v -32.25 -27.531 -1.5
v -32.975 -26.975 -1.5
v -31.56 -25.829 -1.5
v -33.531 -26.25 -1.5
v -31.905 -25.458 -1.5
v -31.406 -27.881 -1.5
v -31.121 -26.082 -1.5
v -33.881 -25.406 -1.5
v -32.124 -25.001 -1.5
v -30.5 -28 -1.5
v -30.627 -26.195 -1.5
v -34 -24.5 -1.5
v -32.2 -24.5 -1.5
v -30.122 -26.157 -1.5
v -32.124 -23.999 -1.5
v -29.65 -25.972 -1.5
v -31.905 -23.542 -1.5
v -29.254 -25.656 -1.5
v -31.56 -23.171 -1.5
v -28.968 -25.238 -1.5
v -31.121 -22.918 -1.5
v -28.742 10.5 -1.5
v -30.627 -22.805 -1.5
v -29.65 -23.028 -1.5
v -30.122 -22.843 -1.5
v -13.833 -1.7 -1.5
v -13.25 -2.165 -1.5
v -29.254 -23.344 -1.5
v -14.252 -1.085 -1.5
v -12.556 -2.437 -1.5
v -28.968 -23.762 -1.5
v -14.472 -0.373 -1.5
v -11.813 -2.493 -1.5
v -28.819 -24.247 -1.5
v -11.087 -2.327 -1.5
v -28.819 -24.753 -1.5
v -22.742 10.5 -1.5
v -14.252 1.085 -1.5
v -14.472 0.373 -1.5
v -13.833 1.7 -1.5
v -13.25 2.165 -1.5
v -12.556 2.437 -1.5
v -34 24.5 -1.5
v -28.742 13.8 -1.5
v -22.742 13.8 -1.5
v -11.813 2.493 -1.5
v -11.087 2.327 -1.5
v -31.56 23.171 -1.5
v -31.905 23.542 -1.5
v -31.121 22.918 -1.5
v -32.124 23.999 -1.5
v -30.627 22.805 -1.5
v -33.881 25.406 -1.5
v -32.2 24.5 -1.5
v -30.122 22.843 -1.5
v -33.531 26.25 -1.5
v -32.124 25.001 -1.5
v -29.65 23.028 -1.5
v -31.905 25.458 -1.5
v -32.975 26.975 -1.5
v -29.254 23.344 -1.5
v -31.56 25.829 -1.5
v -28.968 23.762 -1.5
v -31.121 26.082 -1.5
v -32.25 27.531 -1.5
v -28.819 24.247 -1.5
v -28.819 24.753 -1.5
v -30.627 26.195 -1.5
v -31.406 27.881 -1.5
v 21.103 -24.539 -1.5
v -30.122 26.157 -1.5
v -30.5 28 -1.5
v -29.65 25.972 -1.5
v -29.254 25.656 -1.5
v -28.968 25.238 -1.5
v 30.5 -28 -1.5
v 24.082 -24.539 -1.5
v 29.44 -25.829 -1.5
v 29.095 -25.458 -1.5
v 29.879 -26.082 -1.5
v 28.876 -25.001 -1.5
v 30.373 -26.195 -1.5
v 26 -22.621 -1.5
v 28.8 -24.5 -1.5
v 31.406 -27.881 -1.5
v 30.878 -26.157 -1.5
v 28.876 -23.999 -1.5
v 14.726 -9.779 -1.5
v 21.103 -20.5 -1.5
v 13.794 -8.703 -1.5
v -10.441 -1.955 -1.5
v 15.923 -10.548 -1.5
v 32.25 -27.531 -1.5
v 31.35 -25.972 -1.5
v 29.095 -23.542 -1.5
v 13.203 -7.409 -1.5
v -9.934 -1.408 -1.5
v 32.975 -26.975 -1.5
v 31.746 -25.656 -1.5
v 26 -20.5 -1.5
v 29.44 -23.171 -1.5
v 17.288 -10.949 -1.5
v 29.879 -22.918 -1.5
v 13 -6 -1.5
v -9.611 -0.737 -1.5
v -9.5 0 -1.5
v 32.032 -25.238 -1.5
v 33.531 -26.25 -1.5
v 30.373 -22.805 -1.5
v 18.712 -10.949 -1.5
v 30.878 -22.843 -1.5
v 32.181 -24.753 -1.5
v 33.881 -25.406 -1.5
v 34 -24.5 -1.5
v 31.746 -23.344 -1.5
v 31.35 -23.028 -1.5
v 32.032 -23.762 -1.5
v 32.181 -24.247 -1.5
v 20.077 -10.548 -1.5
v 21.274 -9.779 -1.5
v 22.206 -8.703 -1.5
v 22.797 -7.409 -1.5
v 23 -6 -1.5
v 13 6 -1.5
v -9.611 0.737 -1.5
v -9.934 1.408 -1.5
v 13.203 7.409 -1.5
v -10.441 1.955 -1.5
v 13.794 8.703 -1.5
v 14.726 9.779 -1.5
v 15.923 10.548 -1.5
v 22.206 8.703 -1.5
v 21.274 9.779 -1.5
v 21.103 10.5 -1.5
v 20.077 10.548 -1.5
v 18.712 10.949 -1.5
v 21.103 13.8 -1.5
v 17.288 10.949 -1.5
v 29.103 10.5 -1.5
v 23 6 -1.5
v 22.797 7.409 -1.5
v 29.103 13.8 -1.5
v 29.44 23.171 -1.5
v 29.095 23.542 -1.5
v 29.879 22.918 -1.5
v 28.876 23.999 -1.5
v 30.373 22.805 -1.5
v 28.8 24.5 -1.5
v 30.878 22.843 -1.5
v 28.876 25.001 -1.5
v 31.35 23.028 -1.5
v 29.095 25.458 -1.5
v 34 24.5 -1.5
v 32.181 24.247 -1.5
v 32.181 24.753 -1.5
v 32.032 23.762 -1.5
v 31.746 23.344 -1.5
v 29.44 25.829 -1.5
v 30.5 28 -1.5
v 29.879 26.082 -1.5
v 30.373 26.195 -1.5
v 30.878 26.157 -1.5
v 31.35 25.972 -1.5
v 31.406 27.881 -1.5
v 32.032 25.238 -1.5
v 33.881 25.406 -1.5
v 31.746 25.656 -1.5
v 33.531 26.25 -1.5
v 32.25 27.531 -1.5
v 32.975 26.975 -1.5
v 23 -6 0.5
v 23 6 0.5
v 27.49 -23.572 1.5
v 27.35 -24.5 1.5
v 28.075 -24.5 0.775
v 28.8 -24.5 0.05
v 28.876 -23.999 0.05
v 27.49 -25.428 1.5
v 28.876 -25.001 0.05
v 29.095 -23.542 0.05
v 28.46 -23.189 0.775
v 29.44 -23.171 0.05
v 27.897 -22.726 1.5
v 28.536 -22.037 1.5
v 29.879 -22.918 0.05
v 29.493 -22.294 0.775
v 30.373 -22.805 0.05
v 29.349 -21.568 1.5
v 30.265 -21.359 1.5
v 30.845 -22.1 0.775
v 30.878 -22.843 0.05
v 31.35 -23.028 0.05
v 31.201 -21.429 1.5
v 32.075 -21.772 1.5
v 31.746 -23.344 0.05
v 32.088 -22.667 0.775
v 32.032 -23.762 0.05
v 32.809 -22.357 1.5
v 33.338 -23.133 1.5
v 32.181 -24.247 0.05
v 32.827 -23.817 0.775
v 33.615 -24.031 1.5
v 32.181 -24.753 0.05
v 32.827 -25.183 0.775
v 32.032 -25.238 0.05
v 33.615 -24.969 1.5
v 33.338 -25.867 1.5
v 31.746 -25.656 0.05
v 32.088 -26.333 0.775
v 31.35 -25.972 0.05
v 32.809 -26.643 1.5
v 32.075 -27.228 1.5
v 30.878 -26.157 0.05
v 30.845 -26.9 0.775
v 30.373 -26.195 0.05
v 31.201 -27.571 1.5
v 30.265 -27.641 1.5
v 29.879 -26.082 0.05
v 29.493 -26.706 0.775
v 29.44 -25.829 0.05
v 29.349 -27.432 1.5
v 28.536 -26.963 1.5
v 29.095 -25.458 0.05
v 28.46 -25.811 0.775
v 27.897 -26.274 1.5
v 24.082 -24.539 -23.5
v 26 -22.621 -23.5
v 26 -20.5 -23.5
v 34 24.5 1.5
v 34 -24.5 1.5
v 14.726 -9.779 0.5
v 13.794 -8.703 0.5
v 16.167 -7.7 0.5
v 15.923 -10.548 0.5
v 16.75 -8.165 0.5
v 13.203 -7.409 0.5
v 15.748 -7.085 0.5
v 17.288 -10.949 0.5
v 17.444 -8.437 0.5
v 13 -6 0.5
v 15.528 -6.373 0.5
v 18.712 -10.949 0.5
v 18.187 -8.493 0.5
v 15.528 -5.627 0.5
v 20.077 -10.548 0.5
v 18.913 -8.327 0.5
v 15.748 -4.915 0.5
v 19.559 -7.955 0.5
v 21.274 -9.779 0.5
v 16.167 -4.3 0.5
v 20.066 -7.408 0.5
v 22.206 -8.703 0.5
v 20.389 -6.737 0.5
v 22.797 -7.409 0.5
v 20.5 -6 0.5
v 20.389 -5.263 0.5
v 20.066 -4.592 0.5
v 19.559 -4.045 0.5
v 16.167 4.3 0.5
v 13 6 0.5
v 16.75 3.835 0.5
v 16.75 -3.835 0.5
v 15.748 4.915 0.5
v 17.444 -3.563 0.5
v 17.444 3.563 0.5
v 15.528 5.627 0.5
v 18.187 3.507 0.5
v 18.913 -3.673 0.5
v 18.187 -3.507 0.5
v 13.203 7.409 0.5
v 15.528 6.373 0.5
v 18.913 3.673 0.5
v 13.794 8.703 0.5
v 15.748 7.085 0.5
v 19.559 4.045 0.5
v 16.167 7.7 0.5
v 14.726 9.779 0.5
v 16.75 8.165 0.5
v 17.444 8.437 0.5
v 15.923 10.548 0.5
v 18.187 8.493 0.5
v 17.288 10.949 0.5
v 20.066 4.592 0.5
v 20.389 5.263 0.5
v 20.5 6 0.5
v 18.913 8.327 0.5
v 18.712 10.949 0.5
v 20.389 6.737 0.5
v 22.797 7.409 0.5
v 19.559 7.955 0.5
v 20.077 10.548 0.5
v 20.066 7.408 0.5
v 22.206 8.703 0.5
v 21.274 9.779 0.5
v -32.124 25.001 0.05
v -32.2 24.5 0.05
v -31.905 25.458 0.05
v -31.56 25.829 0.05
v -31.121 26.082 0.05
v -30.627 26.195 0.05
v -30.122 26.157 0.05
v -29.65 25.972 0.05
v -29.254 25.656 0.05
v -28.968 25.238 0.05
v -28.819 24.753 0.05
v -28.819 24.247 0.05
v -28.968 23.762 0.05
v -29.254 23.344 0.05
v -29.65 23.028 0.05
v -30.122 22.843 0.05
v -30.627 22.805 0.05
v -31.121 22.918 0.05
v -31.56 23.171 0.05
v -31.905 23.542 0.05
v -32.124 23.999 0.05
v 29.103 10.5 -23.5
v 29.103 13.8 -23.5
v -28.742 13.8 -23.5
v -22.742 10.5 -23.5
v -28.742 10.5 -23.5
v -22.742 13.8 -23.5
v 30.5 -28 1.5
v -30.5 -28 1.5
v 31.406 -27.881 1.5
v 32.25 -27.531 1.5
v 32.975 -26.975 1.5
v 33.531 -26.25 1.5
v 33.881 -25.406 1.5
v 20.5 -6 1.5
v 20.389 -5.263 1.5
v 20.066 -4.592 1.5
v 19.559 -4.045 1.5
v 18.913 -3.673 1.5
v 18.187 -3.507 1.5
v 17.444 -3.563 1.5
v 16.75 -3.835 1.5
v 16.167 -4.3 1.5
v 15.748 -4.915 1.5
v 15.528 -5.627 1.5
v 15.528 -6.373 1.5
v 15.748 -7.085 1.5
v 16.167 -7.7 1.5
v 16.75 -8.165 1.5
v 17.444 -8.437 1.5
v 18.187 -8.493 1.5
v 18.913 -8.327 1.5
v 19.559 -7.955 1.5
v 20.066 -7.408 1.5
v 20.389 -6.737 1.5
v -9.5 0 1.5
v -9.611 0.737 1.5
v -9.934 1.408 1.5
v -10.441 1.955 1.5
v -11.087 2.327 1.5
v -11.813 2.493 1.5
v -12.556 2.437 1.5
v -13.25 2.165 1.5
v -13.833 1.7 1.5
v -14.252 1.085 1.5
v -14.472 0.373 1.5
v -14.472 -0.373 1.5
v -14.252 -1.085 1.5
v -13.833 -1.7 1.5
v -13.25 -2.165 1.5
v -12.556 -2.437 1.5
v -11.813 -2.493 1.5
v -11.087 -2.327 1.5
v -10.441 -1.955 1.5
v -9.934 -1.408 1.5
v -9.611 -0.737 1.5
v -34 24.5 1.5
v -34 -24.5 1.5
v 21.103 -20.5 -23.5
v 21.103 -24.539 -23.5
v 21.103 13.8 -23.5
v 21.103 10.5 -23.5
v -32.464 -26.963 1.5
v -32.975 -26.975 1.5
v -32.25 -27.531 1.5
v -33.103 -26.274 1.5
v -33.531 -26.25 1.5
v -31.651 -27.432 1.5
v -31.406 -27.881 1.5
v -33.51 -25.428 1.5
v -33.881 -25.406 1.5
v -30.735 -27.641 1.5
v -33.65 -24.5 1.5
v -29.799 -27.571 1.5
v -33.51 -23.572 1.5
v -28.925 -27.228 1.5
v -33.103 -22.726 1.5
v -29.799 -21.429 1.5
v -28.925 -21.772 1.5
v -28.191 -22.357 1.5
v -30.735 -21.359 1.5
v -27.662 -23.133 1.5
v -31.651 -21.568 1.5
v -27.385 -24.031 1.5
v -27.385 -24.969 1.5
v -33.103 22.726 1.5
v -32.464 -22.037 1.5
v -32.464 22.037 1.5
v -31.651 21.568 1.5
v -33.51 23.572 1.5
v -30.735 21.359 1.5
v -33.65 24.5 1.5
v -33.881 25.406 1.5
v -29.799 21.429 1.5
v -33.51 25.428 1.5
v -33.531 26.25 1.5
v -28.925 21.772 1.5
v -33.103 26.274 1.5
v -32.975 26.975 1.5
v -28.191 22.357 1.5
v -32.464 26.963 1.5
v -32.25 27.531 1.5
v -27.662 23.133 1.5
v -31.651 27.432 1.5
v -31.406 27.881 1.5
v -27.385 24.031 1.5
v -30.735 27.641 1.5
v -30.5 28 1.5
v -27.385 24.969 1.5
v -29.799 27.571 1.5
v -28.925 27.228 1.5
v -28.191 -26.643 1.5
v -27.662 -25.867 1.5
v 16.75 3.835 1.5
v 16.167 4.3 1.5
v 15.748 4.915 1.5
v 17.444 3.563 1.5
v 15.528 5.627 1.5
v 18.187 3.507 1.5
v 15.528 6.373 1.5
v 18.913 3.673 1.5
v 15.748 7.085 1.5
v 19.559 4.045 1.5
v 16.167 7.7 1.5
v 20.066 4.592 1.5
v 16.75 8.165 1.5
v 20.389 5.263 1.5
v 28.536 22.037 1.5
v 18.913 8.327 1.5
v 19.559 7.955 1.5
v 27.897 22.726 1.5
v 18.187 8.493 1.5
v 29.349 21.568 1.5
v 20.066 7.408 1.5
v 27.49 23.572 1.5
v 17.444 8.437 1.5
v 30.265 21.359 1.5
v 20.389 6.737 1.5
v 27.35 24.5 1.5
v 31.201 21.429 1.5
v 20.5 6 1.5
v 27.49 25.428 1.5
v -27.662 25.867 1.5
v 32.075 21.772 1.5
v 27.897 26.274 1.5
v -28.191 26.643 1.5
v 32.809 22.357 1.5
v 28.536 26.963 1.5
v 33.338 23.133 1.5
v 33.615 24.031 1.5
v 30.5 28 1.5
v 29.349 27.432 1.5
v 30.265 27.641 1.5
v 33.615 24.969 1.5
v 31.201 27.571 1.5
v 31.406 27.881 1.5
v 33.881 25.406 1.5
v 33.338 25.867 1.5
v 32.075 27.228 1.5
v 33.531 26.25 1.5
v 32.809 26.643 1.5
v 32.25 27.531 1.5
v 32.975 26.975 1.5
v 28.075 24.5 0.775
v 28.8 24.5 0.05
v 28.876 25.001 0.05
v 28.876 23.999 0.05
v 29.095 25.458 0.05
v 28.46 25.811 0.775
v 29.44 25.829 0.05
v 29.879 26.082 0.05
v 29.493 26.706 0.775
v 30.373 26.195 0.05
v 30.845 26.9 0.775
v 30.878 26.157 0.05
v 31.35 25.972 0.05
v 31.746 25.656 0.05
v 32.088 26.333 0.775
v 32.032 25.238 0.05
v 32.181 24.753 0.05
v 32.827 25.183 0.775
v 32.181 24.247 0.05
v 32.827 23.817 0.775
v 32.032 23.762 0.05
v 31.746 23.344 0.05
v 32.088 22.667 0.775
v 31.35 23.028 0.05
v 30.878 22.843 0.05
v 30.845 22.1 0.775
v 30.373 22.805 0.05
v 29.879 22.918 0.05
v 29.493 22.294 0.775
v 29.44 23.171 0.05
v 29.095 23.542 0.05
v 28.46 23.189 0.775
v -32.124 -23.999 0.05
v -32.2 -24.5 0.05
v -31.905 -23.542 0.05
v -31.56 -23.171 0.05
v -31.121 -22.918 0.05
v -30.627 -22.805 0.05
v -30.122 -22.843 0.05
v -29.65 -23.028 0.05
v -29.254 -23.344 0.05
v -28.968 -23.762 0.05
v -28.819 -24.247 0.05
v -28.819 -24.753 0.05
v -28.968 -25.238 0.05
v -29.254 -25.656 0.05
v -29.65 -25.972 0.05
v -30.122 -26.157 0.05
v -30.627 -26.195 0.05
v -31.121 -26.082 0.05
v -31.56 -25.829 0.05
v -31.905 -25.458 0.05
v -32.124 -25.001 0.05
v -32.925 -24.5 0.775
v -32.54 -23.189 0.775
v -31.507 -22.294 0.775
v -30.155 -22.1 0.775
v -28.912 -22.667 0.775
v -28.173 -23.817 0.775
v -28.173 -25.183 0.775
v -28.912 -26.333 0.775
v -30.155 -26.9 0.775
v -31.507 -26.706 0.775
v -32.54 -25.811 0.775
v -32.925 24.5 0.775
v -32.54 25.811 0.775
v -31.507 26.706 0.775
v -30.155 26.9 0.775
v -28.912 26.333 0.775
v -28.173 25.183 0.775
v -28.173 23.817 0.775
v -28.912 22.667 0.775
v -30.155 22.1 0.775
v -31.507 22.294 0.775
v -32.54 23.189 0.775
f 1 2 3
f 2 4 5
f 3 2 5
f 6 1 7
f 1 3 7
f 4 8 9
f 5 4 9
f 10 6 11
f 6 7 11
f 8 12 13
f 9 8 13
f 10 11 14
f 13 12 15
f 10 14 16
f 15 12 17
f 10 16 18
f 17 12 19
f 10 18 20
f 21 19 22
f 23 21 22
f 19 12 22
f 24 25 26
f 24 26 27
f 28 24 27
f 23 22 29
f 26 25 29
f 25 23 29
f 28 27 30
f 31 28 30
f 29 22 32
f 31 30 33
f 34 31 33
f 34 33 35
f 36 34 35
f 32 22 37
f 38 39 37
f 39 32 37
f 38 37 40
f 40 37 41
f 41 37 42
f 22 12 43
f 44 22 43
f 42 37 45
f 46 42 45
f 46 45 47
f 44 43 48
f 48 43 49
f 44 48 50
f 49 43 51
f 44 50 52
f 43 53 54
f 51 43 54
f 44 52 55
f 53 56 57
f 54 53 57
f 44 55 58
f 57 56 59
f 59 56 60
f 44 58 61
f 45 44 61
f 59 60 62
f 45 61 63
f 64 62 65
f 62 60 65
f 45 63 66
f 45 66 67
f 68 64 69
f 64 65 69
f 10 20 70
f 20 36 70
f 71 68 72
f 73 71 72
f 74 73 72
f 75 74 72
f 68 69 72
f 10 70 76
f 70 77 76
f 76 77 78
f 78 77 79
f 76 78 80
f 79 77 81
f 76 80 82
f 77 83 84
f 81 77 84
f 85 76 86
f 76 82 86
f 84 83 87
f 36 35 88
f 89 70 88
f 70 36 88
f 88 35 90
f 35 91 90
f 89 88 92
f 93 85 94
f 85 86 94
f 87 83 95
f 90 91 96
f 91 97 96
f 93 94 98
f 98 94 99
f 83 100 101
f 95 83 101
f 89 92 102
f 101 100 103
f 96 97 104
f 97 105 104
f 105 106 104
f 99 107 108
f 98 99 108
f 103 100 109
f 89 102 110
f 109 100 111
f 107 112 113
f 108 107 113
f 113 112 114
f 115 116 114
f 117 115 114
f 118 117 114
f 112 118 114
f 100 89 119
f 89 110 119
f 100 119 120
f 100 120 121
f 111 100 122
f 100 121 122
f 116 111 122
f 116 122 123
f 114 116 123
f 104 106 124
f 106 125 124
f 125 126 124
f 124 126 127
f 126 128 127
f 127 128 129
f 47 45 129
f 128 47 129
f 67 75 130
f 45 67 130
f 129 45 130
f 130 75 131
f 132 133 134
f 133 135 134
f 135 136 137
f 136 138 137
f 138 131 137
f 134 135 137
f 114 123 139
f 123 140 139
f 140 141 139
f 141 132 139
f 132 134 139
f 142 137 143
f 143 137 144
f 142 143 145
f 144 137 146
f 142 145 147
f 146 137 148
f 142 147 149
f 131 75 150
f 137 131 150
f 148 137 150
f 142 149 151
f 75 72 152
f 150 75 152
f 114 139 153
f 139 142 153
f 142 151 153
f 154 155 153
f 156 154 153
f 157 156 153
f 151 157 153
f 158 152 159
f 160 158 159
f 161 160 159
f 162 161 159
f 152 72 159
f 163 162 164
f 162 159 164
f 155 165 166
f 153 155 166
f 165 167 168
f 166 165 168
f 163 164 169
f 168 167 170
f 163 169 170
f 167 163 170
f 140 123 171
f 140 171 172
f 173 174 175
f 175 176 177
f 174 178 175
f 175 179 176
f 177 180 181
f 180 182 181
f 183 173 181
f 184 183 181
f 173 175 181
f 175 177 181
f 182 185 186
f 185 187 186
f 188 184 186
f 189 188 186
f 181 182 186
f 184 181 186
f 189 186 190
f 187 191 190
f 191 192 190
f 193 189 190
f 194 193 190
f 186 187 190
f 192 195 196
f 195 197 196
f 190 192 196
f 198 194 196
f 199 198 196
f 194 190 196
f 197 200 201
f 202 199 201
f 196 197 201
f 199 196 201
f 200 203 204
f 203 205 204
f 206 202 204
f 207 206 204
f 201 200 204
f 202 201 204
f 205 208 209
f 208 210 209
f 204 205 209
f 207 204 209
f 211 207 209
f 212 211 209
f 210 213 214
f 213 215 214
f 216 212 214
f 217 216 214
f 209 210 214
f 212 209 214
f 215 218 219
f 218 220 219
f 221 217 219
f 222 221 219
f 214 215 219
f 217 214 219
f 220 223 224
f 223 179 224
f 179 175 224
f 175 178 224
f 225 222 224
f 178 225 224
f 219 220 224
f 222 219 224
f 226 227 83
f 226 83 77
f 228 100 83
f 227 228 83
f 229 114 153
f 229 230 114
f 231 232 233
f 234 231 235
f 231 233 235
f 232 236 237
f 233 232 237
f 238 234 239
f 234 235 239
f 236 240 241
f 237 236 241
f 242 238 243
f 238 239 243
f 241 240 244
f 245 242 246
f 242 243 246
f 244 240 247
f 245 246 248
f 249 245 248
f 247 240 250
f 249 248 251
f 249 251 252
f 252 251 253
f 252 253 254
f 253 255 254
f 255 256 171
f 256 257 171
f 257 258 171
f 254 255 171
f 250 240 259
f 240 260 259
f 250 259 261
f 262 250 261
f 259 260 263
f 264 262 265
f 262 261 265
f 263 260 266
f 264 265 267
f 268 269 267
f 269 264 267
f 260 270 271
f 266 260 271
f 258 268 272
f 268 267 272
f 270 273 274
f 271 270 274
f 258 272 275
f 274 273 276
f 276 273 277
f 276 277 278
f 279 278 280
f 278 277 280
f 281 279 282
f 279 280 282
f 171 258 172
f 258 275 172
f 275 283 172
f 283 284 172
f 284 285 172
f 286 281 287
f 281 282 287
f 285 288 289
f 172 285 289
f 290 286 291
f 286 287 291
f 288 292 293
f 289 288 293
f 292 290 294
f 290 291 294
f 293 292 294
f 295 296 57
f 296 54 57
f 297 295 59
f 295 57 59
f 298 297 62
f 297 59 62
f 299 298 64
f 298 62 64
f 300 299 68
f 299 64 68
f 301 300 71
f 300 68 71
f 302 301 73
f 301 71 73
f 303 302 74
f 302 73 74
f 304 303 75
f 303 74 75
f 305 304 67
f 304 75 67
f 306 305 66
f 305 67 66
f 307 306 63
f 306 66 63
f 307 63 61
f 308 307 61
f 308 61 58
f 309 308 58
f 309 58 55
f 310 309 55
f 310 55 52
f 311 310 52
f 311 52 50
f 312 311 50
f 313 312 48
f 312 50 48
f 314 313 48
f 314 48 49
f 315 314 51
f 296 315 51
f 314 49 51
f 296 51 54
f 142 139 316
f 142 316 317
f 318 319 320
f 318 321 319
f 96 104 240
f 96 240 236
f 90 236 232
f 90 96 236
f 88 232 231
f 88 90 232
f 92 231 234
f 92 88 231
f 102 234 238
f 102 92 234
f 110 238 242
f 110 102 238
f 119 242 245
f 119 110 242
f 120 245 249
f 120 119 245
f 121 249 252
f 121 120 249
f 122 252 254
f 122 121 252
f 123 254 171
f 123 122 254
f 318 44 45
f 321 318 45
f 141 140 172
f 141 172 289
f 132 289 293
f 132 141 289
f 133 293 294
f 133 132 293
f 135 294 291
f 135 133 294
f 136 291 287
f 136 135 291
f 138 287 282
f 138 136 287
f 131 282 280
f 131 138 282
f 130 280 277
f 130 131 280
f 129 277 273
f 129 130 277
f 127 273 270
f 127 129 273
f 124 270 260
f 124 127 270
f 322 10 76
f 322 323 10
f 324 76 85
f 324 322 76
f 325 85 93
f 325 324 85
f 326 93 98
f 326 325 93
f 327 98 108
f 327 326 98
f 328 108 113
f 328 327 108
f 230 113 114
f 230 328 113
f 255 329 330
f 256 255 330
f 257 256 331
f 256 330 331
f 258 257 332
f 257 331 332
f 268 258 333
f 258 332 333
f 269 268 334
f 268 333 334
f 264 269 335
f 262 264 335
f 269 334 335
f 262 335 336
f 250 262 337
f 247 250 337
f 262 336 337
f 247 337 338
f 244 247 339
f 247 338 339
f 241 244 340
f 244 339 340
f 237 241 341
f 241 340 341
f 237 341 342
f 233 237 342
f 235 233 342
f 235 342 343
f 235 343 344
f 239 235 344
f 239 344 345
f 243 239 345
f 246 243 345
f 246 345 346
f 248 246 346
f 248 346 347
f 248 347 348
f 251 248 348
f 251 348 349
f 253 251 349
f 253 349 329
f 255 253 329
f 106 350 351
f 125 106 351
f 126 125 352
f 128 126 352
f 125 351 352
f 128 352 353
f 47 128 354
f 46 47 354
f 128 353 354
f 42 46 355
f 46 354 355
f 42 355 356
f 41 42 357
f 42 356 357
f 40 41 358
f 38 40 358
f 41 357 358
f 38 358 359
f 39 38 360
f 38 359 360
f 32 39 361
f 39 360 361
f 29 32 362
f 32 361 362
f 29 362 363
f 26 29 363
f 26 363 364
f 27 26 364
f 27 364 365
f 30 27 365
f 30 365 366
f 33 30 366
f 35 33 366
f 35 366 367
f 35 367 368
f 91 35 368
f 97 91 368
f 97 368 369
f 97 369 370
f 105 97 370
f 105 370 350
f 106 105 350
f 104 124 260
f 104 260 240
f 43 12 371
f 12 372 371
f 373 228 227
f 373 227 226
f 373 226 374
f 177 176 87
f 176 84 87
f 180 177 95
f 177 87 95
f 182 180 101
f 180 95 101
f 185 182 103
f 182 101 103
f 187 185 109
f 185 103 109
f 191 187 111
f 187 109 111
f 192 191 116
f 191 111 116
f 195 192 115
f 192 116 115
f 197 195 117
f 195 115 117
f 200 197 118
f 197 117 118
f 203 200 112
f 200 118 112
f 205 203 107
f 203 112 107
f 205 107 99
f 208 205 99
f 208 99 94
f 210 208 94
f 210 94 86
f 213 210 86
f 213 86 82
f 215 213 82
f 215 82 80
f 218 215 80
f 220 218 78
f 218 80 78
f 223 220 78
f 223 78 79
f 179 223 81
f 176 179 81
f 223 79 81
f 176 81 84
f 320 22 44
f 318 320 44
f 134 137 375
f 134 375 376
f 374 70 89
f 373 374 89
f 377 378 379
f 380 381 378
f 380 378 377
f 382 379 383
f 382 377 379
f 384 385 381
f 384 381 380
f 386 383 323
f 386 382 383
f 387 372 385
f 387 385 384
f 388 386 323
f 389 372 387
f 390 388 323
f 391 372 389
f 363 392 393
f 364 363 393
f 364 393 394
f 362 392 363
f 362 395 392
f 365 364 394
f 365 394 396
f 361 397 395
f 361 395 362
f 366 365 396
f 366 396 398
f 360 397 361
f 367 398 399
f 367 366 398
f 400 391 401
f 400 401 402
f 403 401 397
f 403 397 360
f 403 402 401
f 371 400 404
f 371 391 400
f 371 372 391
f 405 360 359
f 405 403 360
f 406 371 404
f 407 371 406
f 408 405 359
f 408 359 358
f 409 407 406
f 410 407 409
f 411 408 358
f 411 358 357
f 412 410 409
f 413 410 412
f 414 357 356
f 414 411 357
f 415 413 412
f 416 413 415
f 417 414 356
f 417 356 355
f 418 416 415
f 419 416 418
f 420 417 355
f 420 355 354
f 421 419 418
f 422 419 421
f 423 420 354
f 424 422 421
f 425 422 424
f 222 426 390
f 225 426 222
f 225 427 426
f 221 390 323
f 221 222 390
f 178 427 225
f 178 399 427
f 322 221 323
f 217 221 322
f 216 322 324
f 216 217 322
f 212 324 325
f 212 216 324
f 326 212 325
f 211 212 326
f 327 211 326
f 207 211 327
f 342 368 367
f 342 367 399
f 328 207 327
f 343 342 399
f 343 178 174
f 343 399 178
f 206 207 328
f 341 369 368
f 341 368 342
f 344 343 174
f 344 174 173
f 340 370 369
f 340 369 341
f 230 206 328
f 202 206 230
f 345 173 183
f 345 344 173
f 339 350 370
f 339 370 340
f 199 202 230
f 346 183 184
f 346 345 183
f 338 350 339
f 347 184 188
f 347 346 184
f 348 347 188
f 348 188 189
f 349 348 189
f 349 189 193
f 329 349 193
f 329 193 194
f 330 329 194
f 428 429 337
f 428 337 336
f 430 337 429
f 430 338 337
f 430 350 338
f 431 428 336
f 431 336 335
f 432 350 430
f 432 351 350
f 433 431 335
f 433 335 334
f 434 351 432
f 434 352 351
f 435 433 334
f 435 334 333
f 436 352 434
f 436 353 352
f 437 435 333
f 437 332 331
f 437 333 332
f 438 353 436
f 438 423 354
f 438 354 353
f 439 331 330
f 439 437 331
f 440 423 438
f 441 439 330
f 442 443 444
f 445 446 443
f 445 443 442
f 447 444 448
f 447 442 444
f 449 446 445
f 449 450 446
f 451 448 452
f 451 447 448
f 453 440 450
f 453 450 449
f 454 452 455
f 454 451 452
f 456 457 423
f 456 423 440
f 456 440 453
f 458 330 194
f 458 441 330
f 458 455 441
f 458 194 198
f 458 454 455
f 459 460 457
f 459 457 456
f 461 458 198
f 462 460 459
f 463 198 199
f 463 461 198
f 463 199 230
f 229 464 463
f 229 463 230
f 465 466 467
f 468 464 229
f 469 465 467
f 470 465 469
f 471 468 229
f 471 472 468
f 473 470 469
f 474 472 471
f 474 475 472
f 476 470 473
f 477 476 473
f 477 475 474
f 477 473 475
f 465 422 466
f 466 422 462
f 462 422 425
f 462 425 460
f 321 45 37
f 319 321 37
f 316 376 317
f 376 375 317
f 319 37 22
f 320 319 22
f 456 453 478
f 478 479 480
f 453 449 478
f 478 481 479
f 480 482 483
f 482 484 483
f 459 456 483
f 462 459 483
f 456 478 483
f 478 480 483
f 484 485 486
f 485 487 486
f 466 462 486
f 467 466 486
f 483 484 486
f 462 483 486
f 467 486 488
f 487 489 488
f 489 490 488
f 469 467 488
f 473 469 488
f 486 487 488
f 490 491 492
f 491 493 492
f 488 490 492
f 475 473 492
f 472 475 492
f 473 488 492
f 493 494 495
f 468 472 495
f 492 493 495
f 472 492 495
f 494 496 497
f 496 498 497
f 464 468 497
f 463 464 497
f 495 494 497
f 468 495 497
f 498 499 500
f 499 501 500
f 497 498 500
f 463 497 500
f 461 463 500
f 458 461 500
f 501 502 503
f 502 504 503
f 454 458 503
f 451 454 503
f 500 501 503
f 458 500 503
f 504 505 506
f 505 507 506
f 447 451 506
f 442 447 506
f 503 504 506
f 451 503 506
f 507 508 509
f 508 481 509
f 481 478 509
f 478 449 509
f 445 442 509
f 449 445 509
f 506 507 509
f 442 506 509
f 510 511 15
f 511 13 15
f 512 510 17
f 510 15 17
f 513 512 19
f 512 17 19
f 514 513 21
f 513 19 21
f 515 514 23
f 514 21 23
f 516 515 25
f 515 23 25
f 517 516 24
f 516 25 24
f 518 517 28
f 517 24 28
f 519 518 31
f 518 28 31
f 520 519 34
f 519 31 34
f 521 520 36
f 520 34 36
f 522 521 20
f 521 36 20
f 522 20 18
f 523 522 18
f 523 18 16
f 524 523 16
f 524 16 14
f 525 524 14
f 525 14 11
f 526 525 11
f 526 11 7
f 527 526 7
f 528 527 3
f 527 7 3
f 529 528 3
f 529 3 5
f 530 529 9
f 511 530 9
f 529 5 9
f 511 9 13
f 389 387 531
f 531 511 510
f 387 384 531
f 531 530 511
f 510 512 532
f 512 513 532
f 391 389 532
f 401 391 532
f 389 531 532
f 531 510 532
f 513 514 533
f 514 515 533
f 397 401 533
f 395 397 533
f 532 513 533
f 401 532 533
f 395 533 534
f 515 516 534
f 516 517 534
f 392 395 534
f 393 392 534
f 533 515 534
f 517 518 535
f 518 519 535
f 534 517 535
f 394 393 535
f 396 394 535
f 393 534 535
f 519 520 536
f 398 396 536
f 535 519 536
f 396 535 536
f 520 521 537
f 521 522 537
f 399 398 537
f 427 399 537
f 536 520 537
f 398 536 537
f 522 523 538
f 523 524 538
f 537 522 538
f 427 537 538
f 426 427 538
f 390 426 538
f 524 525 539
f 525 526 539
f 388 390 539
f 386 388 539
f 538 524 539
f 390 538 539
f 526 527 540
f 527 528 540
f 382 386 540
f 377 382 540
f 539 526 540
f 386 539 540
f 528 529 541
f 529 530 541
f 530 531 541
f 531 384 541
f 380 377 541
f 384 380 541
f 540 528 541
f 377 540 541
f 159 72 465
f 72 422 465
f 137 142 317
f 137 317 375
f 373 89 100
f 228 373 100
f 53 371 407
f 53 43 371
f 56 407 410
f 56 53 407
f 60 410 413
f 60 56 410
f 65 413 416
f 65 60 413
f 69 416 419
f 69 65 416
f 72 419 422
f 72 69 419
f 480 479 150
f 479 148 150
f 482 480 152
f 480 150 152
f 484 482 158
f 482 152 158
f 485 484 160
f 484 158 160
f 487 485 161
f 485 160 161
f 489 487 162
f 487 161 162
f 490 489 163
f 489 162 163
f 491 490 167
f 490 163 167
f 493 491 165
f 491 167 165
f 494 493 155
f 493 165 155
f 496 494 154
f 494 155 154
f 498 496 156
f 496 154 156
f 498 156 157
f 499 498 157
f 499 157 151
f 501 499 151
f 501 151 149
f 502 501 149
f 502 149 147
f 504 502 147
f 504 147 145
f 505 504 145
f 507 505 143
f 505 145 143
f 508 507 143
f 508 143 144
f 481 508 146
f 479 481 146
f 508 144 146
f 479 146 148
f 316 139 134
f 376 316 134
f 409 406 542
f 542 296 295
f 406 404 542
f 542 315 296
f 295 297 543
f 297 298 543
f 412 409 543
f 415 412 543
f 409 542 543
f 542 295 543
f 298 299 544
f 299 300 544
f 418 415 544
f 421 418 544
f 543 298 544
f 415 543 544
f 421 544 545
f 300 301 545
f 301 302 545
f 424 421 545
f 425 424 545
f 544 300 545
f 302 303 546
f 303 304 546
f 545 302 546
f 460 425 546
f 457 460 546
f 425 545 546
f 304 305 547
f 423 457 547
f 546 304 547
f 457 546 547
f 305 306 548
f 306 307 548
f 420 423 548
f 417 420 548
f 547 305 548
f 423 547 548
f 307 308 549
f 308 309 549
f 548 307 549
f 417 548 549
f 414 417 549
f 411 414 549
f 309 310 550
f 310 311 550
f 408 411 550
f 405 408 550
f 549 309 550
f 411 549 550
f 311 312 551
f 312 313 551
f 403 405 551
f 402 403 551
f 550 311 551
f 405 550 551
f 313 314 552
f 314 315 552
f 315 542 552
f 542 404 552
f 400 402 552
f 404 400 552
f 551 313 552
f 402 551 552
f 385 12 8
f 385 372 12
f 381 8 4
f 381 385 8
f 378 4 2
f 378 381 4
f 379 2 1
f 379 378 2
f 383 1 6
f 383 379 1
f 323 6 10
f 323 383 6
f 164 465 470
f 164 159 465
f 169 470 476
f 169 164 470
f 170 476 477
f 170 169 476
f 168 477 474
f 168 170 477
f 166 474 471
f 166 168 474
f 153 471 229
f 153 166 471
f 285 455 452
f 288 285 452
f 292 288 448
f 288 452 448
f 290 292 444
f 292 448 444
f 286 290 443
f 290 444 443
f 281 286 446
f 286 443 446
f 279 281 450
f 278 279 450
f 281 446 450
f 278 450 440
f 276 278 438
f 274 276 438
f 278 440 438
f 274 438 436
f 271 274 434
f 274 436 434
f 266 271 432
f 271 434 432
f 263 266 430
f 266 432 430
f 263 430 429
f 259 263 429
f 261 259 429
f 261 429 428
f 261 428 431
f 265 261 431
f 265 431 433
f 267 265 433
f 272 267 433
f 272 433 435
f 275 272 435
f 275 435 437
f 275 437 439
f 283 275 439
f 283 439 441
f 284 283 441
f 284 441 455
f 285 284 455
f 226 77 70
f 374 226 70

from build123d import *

# Parameters (mm, degrees)
ESQUISSE1_W                                    = 68
ESQUISSE1_H                                    = 56
BOSS_EXTRU_1_DEPTH                             = 1.5
ENL_V_MAT_EXTRU_1_REACH                        = 68.114
ESQUISSE2_R                                    = 2.5
CONG_1_R                                       = 3.5
FRAISAGE_POUR_VIS_T_TE_FRAIS_E_M31_D           = 3.4
FRAISAGE_POUR_VIS_T_TE_FRAIS_E_M31_DEPTH       = 21.67
FRAISAGE_POUR_VIS_T_TE_FRAIS_E_M31_CSINK_D     = 6.3
FRAISAGE_POUR_VIS_T_TE_FRAIS_E_M31_CSINK_ANGLE = 90
FRAISAGE_POUR_VIS_T_TE_FRAIS_E_M31_TIP         = 1.021463052
BOSS_EXTRU_2_DEPTH                             = 22
ENL_V_MAT_EXTRU_2_DEPTH                        = 2


with BuildPart() as part:
    # Esquisse1 → Boss.-Extru.1 (new, symmetric)
    with BuildSketch(Plane.XY):
        Rectangle(ESQUISSE1_W, ESQUISSE1_H)
    extrude(amount=BOSS_EXTRU_1_DEPTH, both=True)

    # Esquisse2 → Enlèv. mat.-Extru.1 (cut, up to next)
    with BuildSketch(Plane(origin=(-25.81698593, 0, 1.5), x_dir=(1, 0, 0), z_dir=(0, 0, 1)), mode=Mode.PRIVATE) as enl_v_mat_extru_1_sk1:
        with Locations((13.81698593, 0)):
            Circle(ESQUISSE2_R)
    enl_v_mat_extru_1_tool1 = extrude(enl_v_mat_extru_1_sk1.sketch, amount=-ENL_V_MAT_EXTRU_1_REACH, mode=Mode.PRIVATE) & part.part
    # Esquisse2 → Enlèv. mat.-Extru.1 (cut, up to next)
    with BuildSketch(Plane(origin=(-25.81698593, 0, 1.5), x_dir=(1, 0, 0), z_dir=(0, 0, 1)), mode=Mode.PRIVATE) as enl_v_mat_extru_1_sk2:
        with Locations((43.81698593, 6)):
            Circle(ESQUISSE2_R)
    enl_v_mat_extru_1_tool2 = extrude(enl_v_mat_extru_1_sk2.sketch, amount=-ENL_V_MAT_EXTRU_1_REACH, mode=Mode.PRIVATE) & part.part
    # Esquisse2 → Enlèv. mat.-Extru.1 (cut, up to next)
    with BuildSketch(Plane(origin=(-25.81698593, 0, 1.5), x_dir=(1, 0, 0), z_dir=(0, 0, 1)), mode=Mode.PRIVATE) as enl_v_mat_extru_1_sk3:
        with Locations((43.81698593, -6)):
            Circle(ESQUISSE2_R)
    enl_v_mat_extru_1_tool3 = extrude(enl_v_mat_extru_1_sk3.sketch, amount=-ENL_V_MAT_EXTRU_1_REACH, mode=Mode.PRIVATE) & part.part
    add(enl_v_mat_extru_1_tool1.solids().sort_by_distance((-12, 0, 1.5))[0], mode=Mode.SUBTRACT)
    add(enl_v_mat_extru_1_tool2.solids().sort_by_distance((18, 6, 1.5))[0], mode=Mode.SUBTRACT)
    add(enl_v_mat_extru_1_tool3.solids().sort_by_distance((18, -6, 1.5))[0], mode=Mode.SUBTRACT)

    # Congé1
    cong_1_edges = [part.edges().sort_by_distance(p)[0] for p in [
        (34, -28, 0),
        (-34, -28, 0),
        (-34, 28, 0),
        (34, 28, 0),
    ]]
    fillet(cong_1_edges, radius=CONG_1_R)

    # Fraisage pour vis à tête fraisée M31
    with Locations(Plane.XY.offset(1.5)):
        with Locations((-30.5, -24.5), (-30.5, 24.5), (30.5, 24.5), (30.5, -24.5)):
            CounterSinkHole(FRAISAGE_POUR_VIS_T_TE_FRAIS_E_M31_D / 2, FRAISAGE_POUR_VIS_T_TE_FRAIS_E_M31_CSINK_D / 2, depth=FRAISAGE_POUR_VIS_T_TE_FRAIS_E_M31_DEPTH, counter_sink_angle=FRAISAGE_POUR_VIS_T_TE_FRAIS_E_M31_CSINK_ANGLE)
            with Locations((0, 0, -(FRAISAGE_POUR_VIS_T_TE_FRAIS_E_M31_DEPTH + FRAISAGE_POUR_VIS_T_TE_FRAIS_E_M31_TIP / 2))):  # 118° drill point
                Cone(0, FRAISAGE_POUR_VIS_T_TE_FRAIS_E_M31_D / 2, FRAISAGE_POUR_VIS_T_TE_FRAIS_E_M31_TIP, mode=Mode.SUBTRACT)

    # Esquisse6 → Boss.-Extru.2 (add)
    with BuildSketch(Plane(origin=(0, 0, -1.5), x_dir=(-1, 0, 0), z_dir=(0, 0, -1))):
        Polygon((-21.103469563, -20.5), (-26, -20.5), (-26, -22.621320344), (-24.082132084, -24.539188259), (-21.103469563, -24.539188259), align=None)
        Polygon((22.741804985, 10.5), (27.5, 10.5), (28.741804985, 10.5), (28.741804985, 13.8), (22.741804985, 13.8), align=None)
        Polygon((-21.103469563, 10.5), (-26, 10.5), (-29.103469563, 10.5), (-29.103469563, 13.8), (-21.103469563, 13.8), align=None)
    extrude(amount=BOSS_EXTRU_2_DEPTH)

    # Esquisse7 → Enlèv. mat.-Extru.2 (cut)
    with BuildSketch(Plane(origin=(0, 0, -1.5), x_dir=(-1, 0, 0), z_dir=(0, 0, -1))):
        with BuildLine():
            Line((-23, -6), (-23, 6))
            ThreePointArc((-23, 6), (-18, 11), (-13, 6))
            Line((-13, 6), (-13, -6))
            ThreePointArc((-13, -6), (-18, -11), (-23, -6))
        make_face()
    extrude(amount=-ENL_V_MAT_EXTRU_2_DEPTH, mode=Mode.SUBTRACT)


solid = part.part
